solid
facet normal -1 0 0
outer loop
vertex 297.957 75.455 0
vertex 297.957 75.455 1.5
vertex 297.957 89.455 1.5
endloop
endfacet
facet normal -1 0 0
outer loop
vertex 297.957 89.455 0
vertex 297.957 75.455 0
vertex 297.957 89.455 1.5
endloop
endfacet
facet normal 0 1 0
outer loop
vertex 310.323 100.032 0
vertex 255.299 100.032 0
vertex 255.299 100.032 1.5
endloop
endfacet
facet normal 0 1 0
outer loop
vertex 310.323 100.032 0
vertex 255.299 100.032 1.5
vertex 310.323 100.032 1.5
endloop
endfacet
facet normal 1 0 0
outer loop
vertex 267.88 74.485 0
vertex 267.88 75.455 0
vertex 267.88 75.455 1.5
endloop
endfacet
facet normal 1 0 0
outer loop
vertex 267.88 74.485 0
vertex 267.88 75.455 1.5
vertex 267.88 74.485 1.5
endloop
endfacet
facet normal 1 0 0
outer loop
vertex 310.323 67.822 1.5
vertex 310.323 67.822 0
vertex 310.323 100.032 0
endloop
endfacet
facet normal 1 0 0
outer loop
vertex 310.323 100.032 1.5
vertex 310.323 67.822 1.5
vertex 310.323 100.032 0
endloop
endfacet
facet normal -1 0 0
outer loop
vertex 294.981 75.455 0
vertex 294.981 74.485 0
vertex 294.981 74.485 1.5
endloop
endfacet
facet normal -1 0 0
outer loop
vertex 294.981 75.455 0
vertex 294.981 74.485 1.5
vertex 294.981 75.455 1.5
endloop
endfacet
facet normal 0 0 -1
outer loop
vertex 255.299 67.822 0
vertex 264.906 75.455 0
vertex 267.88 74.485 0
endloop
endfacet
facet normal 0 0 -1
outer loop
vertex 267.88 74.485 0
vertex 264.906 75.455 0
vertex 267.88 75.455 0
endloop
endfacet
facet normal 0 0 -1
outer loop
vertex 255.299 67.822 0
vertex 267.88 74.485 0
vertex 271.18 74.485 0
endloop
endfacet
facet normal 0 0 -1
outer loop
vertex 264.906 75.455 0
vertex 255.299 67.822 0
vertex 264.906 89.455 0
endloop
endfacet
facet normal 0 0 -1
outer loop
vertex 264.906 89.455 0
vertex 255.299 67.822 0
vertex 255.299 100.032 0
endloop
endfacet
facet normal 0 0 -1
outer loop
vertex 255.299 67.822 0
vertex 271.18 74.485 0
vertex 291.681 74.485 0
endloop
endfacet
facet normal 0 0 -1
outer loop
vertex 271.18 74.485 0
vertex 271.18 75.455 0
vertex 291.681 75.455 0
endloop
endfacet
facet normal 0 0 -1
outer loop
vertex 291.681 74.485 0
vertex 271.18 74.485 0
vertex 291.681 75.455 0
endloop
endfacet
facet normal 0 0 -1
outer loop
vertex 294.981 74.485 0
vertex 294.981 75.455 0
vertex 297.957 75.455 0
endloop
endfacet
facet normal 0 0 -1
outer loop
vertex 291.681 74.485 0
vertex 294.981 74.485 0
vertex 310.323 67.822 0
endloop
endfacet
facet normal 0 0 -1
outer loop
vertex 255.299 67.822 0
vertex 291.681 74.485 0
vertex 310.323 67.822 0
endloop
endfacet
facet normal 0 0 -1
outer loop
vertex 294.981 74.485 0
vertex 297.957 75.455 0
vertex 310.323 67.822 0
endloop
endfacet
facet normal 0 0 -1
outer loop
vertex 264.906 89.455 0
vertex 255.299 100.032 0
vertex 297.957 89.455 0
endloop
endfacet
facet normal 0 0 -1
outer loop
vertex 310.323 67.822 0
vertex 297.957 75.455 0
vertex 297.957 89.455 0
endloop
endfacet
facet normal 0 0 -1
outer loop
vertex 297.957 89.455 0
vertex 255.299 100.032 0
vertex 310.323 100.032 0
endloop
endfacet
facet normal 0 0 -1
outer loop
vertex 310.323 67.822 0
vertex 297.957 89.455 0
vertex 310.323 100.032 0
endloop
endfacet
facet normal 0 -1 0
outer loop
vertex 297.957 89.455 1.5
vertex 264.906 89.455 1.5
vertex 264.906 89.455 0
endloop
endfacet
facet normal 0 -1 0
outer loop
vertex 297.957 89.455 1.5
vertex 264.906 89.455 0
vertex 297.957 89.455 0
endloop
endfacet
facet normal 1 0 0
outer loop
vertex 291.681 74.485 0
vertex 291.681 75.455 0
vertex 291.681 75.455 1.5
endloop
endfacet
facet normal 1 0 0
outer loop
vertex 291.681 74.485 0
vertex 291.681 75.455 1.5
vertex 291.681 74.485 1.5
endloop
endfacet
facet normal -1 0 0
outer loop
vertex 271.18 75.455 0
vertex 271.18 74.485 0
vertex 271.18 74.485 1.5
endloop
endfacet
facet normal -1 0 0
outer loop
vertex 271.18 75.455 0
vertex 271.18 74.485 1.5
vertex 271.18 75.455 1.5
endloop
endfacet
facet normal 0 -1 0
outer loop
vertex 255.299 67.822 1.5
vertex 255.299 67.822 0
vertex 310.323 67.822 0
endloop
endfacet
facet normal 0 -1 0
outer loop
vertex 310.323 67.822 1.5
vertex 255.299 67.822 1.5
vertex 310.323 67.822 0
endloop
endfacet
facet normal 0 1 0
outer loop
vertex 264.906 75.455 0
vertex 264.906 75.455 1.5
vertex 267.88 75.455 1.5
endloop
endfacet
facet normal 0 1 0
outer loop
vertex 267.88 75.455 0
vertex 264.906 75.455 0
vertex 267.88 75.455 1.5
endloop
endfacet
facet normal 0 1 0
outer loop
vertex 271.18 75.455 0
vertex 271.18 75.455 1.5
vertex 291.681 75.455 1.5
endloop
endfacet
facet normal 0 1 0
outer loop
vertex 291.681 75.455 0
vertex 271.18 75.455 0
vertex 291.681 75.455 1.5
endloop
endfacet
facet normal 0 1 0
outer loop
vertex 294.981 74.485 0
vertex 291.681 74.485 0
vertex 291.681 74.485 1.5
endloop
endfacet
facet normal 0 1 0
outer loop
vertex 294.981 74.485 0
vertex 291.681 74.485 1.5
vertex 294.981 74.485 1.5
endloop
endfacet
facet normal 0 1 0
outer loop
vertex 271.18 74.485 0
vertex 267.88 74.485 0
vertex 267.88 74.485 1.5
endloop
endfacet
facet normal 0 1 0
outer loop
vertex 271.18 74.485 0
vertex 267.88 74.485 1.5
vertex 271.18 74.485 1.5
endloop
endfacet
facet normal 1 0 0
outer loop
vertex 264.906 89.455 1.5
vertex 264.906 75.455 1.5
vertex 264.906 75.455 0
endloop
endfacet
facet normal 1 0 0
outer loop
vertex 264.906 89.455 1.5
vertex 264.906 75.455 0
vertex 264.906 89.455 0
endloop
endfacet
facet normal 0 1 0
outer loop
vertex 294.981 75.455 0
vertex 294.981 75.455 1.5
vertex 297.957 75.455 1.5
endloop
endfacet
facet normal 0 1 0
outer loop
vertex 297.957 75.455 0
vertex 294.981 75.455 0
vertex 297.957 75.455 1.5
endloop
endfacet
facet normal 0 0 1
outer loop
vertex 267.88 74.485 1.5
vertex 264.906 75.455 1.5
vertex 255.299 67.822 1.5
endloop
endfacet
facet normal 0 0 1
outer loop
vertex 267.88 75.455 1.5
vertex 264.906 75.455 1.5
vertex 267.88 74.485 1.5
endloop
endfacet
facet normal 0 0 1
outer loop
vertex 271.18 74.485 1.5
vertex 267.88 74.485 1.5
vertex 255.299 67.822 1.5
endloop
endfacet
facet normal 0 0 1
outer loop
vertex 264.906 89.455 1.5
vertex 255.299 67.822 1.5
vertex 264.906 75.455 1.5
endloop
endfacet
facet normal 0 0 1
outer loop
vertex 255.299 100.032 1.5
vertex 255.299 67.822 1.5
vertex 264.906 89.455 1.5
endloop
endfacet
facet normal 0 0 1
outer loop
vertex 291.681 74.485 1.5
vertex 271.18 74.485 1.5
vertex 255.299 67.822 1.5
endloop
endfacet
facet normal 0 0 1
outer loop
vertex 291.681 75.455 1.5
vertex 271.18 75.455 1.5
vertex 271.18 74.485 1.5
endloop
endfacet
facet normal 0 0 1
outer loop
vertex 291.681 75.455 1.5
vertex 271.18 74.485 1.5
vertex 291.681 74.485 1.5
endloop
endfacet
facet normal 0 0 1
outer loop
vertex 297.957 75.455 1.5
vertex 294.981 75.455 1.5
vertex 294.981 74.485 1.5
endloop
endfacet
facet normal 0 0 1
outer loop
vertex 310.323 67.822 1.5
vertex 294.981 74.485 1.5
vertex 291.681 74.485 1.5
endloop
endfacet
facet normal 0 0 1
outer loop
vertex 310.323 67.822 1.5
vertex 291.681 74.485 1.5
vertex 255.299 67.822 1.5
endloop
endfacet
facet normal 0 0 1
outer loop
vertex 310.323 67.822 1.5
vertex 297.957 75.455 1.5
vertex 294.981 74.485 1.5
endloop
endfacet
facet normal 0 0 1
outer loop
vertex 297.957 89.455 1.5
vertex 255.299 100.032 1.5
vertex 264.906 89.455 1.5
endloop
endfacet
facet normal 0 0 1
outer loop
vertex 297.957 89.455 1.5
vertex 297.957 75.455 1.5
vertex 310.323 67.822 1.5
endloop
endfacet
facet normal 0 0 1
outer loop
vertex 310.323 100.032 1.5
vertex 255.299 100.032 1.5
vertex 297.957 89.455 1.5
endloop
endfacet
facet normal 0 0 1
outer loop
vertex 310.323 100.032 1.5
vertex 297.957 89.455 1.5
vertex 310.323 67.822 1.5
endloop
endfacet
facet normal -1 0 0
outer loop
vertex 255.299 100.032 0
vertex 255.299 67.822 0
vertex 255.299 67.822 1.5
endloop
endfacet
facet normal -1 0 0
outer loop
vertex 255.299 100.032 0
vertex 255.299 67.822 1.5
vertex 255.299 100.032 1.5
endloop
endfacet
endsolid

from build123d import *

# Parameters (mm, degrees)
SKETCH3_W               = 55.024039141
SKETCH3_H               = 32.210333873
BOSS_EXTRUDE1_DEPTH     = 1.5
SKETCH4_W               = 14
SKETCH4_H               = 14
CUT_EXTRUDE1_DEPTH      = 1.5
CUT_EXTRUDE4_DEPTH      = 327.051192929
CUT_EXTRUDE4_DEPTH_BACK = 327.051192929


with BuildPart() as part:
    # Sketch3 → Boss-Extrude1 (new body)
    with BuildSketch(Plane.XY):
        with Locations((282.811419242, 83.927296462)):
            Rectangle(SKETCH3_W, SKETCH3_H)
    extrude(amount=BOSS_EXTRUDE1_DEPTH)

    # Sketch4 → Cut-Extrude1 (cut)
    with BuildSketch(Plane.XY.offset(1.5)):
        with Locations((271.905830275, 82.45473243)):
            Rectangle(SKETCH4_W, SKETCH4_H)
        with Locations((290.956988381, 82.45473243)):
            Rectangle(SKETCH4_W, SKETCH4_H)
    extrude(amount=-CUT_EXTRUDE1_DEPTH, mode=Mode.SUBTRACT)

    # Sketch1 → Cut-Extrude4 (cut, two sides: drawn at the far end of the back side and taken through both)
    with BuildSketch(Plane.XY.offset(-CUT_EXTRUDE4_DEPTH_BACK)):
        Polygon((272.906316619, 84.755597823), (272.906316619, 87.985794184), (266.155906266, 87.985794184), (266.155906266, 84.755597823), (265.330856112, 84.755597823), (265.330856112, 81.955427603), (266.155906266, 81.955427603), (266.155906266, 75.684746413), (267.880011074, 75.684746413), (267.880011074, 74.484573455), (271.18021169, 74.484573455), (271.18021169, 75.684746413), (272.906316619, 75.684746413), (272.906316619, 80.155418181), (274.431409328, 80.155418181), (274.431409328, 75.45473243), (288.431409328, 75.45473243), (288.431409328, 80.155418181), (289.956502038, 80.155418181), (289.956502038, 75.684746413), (291.680606845, 75.684746413), (291.680606845, 74.484573455), (294.980807461, 74.484573455), (294.980807461, 75.684746413), (296.70691239, 75.684746413), (296.70691239, 81.955427603), (297.530962483, 81.955427603), (297.530962483, 84.755446764), (296.70691239, 84.755446764), (296.70691239, 87.985643125), (289.956502038, 87.985643125), (289.956502038, 84.755446764), (288.431409328, 84.755446764), (288.431409328, 89.45473243), (274.431409328, 89.45473243), (274.431409328, 84.755597823), align=None)
    extrude(amount=CUT_EXTRUDE4_DEPTH + CUT_EXTRUDE4_DEPTH_BACK, mode=Mode.SUBTRACT)


solid = part.part
